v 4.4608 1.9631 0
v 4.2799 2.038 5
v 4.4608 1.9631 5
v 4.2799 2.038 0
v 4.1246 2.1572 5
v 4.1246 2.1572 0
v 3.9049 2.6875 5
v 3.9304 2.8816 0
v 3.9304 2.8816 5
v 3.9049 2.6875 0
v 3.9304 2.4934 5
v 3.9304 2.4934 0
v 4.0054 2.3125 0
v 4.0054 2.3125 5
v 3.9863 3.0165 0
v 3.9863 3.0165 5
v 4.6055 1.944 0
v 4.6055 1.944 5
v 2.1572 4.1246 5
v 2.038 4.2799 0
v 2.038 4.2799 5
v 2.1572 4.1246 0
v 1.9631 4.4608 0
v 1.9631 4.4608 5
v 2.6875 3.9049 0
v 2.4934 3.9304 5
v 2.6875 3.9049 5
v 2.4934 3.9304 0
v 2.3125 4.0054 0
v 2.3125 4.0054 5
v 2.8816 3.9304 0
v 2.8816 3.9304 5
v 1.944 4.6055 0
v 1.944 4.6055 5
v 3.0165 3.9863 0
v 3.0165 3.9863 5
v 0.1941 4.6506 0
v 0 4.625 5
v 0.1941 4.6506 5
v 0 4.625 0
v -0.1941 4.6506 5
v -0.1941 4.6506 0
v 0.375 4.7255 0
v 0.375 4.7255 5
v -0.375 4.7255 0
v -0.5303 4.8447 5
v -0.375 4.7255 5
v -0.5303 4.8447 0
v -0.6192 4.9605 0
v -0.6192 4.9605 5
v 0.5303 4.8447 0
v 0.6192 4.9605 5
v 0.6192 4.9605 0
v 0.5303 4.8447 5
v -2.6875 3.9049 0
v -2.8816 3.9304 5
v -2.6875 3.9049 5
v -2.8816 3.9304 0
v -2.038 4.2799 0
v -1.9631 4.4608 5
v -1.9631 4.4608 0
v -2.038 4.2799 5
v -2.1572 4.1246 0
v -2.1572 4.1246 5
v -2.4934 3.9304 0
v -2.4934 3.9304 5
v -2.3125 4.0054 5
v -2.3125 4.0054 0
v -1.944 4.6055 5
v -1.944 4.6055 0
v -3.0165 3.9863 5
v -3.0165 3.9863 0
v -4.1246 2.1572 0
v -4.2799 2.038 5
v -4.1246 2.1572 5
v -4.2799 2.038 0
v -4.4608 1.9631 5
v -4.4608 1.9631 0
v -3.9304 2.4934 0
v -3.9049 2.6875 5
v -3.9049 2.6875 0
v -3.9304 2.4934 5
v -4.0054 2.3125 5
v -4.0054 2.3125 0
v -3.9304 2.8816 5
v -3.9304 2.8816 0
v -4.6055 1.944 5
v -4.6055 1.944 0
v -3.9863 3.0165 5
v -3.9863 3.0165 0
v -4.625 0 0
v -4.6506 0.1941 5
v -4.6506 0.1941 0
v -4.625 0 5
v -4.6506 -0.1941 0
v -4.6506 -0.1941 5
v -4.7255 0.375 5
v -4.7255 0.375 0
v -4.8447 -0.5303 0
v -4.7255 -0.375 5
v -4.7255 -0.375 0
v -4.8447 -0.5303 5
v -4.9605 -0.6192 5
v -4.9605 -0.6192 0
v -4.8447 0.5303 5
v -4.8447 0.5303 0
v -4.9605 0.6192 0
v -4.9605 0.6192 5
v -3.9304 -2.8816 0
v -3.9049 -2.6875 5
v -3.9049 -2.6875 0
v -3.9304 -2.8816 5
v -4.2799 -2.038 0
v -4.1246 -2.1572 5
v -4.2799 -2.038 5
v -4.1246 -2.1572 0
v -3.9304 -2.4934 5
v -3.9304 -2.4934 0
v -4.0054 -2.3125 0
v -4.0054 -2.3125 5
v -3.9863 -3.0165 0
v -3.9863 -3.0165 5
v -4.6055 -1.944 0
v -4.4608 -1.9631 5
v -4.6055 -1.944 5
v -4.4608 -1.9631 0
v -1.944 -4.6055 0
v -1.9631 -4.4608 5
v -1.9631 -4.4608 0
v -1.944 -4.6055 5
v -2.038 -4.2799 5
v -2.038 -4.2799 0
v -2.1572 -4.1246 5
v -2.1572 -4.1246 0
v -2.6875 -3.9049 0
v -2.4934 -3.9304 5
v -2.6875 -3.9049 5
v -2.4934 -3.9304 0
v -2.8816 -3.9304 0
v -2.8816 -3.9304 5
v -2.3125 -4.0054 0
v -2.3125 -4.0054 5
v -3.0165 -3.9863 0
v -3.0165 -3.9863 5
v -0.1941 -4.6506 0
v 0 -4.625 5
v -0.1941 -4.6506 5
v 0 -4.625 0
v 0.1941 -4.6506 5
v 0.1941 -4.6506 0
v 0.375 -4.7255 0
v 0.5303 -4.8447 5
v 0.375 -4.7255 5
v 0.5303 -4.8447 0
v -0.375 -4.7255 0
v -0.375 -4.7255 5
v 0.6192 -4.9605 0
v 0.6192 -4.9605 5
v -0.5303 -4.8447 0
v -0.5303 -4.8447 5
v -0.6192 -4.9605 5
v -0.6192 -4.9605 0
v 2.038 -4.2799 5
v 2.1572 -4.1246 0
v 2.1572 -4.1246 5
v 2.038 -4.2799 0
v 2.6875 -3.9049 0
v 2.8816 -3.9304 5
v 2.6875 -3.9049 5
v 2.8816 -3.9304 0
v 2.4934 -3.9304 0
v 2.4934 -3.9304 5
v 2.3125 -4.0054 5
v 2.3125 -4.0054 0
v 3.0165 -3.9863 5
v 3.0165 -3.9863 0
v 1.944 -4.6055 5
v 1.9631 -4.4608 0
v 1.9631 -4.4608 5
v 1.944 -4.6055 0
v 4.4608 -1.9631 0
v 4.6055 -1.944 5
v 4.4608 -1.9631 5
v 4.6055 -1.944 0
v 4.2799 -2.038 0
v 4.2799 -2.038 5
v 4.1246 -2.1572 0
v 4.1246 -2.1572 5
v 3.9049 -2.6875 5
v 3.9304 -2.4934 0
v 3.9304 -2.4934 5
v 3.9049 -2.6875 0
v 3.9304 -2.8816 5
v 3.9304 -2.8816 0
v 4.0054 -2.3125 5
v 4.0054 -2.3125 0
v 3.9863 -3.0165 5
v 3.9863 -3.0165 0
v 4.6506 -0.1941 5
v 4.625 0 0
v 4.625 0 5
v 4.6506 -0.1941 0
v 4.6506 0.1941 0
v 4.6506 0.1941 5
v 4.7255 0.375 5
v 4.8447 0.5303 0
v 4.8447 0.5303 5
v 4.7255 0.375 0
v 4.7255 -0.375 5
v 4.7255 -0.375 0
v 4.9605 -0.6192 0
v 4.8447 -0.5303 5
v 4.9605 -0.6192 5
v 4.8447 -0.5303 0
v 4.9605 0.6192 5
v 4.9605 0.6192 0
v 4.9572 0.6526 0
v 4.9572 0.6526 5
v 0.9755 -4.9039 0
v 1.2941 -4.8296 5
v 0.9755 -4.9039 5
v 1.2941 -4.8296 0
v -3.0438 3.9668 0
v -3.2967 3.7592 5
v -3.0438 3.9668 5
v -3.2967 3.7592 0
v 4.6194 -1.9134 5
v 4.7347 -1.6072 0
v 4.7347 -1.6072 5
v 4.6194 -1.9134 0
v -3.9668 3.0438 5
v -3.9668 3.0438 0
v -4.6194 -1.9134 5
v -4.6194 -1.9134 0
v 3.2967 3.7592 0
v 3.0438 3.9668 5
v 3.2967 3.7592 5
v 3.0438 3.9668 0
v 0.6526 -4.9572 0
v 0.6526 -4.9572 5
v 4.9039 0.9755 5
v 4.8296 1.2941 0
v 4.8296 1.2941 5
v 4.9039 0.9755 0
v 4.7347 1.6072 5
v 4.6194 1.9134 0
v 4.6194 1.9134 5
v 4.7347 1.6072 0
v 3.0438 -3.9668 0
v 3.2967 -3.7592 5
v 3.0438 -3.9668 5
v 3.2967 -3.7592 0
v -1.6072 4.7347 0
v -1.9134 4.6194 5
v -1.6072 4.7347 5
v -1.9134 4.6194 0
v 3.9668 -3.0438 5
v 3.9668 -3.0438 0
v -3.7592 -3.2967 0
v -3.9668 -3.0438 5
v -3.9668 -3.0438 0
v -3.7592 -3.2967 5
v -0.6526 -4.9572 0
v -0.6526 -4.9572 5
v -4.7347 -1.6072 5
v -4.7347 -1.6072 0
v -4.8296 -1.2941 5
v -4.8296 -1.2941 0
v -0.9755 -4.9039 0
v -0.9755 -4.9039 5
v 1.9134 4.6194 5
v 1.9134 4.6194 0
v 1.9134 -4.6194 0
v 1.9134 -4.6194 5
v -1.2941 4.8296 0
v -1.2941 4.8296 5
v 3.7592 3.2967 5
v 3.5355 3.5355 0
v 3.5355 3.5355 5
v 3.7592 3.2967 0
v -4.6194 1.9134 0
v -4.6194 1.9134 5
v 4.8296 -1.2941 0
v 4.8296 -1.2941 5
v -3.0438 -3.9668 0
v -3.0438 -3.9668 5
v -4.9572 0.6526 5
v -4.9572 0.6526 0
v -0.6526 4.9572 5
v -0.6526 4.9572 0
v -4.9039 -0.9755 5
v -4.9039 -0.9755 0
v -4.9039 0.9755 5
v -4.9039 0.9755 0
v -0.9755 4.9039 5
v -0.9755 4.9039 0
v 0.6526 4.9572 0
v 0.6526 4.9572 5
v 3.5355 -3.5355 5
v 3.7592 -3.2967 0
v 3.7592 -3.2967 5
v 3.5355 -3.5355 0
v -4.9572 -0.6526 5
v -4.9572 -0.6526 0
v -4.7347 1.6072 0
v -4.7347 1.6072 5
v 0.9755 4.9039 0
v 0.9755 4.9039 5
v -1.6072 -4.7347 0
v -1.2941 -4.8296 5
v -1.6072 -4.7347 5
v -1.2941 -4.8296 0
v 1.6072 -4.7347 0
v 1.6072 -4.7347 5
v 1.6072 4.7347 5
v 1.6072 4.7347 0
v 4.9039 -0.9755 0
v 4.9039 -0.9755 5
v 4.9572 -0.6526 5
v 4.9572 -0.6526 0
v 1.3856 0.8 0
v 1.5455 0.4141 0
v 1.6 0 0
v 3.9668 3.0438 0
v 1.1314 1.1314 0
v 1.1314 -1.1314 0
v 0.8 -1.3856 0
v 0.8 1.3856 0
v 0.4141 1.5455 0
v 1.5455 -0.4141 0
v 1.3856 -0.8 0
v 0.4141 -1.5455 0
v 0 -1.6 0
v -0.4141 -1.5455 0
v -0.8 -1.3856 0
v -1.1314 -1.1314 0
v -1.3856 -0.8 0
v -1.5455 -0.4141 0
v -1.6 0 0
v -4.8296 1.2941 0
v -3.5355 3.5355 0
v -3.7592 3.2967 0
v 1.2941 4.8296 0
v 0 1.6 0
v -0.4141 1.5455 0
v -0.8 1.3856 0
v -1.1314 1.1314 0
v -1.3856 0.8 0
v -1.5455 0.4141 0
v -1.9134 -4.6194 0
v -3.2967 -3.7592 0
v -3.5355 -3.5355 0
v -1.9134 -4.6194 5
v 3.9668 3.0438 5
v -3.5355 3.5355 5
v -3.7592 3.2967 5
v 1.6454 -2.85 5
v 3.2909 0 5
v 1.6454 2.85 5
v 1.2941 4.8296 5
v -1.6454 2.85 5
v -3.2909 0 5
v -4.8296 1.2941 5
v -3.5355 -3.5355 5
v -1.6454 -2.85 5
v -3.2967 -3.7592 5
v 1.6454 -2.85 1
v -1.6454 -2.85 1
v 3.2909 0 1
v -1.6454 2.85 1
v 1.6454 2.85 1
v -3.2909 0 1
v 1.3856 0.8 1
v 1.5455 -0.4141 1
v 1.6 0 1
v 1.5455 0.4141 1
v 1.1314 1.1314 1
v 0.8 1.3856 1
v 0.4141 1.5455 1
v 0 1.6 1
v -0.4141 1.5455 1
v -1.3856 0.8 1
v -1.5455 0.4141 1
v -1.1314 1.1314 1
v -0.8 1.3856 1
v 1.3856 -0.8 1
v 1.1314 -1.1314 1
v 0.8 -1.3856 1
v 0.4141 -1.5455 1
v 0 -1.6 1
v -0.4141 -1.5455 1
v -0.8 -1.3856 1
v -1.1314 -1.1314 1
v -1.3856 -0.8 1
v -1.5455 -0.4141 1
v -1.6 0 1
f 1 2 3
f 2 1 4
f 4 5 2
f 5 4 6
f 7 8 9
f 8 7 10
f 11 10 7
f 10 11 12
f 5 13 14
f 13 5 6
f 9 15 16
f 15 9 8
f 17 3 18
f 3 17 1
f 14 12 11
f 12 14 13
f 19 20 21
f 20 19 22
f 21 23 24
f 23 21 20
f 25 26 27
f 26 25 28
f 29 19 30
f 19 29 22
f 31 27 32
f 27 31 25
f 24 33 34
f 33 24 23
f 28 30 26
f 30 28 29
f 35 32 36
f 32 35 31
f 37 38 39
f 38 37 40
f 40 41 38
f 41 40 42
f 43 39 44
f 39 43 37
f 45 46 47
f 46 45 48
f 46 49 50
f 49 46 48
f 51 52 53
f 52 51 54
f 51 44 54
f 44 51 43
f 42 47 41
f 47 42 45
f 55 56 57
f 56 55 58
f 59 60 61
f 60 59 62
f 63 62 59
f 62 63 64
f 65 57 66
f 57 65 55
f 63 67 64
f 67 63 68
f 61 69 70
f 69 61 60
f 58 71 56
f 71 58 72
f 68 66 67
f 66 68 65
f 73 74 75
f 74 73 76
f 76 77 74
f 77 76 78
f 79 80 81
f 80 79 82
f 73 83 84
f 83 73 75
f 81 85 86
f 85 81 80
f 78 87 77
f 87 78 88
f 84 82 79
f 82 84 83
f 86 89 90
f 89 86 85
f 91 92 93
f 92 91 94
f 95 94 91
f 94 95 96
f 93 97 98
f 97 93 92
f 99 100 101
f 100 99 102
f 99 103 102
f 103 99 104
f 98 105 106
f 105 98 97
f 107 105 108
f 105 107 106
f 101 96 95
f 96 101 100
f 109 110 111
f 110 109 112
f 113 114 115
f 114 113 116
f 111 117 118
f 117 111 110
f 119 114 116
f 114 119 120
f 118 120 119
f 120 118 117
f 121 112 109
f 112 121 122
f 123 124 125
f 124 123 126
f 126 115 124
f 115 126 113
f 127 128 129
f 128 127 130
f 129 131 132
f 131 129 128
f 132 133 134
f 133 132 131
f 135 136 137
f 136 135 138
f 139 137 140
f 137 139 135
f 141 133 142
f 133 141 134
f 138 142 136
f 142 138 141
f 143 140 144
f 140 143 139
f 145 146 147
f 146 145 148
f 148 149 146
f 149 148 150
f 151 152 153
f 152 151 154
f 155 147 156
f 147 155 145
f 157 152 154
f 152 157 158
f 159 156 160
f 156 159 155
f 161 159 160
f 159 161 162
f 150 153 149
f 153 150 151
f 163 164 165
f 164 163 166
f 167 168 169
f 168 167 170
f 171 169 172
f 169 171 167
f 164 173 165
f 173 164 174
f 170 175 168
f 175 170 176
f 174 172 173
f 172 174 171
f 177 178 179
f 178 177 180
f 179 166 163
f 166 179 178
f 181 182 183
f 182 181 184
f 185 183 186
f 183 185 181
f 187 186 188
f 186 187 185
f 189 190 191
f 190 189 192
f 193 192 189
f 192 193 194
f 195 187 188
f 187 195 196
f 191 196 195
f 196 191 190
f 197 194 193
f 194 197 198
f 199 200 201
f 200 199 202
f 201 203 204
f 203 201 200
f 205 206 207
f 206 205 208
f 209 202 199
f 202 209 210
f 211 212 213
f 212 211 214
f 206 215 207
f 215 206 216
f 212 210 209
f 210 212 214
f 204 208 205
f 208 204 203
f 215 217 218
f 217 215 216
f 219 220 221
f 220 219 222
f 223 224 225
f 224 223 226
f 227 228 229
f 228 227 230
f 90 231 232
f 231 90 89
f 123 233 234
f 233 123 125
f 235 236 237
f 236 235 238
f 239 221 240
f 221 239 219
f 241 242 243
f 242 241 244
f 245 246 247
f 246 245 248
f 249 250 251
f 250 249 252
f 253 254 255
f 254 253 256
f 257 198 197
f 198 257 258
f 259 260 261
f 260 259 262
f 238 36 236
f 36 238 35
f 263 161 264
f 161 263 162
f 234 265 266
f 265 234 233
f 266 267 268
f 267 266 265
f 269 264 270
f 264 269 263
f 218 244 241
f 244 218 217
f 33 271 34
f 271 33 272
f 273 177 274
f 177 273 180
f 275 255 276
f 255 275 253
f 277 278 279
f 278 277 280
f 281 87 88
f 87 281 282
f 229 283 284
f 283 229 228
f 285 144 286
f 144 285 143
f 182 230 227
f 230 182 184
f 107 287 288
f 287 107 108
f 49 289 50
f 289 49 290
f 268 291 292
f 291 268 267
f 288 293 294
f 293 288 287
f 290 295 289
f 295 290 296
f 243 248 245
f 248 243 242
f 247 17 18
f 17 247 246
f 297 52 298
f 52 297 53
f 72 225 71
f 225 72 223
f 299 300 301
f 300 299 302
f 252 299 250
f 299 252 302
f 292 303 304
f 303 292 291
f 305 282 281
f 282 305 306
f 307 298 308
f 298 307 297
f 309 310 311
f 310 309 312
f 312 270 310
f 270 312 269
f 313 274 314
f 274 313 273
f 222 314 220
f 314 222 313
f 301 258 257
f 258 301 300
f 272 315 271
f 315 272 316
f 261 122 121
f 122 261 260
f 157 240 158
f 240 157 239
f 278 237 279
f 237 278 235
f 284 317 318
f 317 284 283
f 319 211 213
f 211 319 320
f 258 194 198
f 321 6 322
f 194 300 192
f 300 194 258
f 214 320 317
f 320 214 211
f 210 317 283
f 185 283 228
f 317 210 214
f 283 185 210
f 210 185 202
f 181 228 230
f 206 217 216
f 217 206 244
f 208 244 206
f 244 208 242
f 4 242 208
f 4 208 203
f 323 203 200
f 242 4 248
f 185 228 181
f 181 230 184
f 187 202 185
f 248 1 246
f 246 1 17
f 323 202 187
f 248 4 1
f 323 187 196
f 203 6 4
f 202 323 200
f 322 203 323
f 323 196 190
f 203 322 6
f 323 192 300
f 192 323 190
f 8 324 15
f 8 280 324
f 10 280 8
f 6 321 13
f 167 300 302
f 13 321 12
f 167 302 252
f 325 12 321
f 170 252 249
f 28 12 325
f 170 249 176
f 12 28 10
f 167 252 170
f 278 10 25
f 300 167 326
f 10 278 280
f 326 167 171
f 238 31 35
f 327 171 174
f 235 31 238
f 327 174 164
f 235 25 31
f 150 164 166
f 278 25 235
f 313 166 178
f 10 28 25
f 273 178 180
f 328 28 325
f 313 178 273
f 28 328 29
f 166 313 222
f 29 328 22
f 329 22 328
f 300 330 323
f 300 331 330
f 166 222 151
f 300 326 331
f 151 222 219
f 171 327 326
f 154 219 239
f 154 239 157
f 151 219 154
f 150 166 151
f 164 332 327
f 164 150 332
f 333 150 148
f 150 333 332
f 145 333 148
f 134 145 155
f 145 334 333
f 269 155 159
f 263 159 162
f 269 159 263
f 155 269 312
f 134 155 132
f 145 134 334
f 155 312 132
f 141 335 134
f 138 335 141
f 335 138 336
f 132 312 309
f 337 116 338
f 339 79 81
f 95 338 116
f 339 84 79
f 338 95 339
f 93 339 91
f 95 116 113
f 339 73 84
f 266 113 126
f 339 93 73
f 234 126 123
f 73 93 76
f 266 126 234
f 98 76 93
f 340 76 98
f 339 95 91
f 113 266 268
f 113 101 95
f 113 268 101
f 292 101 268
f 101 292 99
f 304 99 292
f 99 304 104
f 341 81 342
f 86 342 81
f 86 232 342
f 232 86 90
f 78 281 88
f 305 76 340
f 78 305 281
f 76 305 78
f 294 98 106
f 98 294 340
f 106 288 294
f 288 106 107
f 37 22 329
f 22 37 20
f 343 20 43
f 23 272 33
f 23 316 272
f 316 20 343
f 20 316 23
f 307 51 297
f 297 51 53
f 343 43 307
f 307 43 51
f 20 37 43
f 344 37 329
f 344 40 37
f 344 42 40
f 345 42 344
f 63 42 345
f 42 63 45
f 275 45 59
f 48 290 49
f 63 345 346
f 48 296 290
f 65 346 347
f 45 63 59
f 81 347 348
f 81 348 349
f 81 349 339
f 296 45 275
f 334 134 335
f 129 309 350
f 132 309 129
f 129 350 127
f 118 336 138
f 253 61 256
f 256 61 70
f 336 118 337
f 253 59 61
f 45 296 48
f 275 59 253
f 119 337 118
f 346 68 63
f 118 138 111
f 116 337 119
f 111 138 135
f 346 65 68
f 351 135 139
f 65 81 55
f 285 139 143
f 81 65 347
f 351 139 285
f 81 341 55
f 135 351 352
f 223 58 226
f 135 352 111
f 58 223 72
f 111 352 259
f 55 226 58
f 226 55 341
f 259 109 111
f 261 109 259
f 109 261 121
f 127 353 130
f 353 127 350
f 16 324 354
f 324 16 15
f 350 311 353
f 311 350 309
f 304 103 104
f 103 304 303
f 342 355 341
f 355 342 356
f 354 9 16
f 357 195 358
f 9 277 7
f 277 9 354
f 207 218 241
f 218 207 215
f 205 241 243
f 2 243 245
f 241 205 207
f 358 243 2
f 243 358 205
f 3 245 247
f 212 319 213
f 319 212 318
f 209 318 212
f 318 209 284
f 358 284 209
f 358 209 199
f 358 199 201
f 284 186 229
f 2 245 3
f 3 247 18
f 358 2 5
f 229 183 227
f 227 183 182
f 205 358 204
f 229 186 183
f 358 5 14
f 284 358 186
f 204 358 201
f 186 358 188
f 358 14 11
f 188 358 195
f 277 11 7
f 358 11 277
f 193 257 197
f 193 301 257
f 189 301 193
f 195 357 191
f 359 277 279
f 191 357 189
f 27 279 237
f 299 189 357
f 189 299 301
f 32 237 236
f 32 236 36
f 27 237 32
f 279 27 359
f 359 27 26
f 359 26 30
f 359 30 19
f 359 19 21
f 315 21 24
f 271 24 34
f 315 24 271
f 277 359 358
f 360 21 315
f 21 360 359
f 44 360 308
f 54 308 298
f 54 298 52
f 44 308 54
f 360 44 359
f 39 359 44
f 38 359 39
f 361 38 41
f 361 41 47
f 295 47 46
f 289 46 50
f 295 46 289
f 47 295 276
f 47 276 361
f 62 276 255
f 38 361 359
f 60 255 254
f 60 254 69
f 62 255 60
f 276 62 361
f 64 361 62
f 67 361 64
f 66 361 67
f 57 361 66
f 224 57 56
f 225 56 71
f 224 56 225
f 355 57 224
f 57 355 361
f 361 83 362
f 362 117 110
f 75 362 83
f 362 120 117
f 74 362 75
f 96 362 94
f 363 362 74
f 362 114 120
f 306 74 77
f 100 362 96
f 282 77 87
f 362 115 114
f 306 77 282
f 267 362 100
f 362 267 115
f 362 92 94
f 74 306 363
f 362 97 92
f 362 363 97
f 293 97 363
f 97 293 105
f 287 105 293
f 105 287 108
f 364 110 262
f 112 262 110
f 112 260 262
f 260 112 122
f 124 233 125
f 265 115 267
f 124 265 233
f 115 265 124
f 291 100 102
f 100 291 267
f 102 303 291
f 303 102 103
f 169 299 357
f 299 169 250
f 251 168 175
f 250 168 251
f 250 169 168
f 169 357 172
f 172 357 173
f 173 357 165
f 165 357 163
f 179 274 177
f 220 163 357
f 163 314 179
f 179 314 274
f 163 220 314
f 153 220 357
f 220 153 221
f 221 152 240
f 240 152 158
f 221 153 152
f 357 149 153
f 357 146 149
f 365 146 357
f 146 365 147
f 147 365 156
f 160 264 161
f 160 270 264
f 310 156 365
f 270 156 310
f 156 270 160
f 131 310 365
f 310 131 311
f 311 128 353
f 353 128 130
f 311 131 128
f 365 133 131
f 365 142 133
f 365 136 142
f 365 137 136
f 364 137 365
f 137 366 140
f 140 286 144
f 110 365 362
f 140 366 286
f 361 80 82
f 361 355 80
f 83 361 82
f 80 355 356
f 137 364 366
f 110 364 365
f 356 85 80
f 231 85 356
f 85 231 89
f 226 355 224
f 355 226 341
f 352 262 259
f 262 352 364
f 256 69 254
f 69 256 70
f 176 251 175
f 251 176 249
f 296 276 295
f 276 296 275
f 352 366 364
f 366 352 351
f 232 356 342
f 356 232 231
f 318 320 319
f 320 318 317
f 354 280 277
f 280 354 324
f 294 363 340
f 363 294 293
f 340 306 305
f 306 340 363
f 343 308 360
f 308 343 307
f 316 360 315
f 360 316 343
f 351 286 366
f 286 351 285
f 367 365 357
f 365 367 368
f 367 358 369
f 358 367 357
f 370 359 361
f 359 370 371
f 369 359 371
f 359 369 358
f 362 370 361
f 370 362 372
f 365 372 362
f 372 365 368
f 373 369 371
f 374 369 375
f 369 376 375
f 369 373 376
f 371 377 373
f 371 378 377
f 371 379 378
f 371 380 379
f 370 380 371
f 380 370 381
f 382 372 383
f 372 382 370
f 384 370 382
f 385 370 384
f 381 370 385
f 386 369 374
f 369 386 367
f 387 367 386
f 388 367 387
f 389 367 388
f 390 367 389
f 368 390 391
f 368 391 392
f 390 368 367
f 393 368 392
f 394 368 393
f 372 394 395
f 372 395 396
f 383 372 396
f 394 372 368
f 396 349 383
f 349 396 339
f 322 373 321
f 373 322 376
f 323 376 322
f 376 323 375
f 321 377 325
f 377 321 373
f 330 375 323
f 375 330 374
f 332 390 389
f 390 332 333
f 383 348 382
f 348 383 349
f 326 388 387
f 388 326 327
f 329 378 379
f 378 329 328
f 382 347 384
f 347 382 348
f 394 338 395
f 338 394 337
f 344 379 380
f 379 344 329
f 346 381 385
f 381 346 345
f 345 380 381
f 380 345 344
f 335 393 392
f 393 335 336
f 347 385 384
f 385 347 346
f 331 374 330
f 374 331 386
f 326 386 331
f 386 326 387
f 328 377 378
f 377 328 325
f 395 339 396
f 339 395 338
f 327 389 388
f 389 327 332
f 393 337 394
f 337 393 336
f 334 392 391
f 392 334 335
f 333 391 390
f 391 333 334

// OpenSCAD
// constraints
looseFit = 0.3; // padding to make 3D printed parts fit loosely on real objects
tightFit = 0.1; // padding to make 3D printed parts fit tightly on real objects
antiFit = 1; // wall-on-wall does not work in openSCAD
screwDiameter = 3+2*tightFit; // M3 screw
nutWidth = 5.5+2*tightFit; // M3 hex nut short width

// design parameters
headDiameter = 10;
headHeight = 5;
paddingBottom = 1;

// dent parameters
dents = 12;
dentDiameter = 1.5;
dentRadius = headDiameter/2+0.5*dentDiameter/2;

// build head
difference() {
    // base
    cylinder(d=headDiameter, h=headHeight, $fn=96);
    
    // cutout hex nut
    translate([0, 0, paddingBottom]) cylinder(d=nutWidth/sqrt(3)*2, h=headHeight, $fn=6);
    
    // cutout screw hole
    translate([0, 0, -antiFit]) cylinder(d=screwDiameter, h=paddingBottom+2*antiFit, $fn=24);
    
    // cutout dents
    for (i = [1:dents]) {
       rotate([0, 0, i*(360/dents)]) translate([dentRadius, 0, -antiFit]) cylinder(d=dentDiameter, h=headHeight+2*antiFit, $fn=24);
    }
}
